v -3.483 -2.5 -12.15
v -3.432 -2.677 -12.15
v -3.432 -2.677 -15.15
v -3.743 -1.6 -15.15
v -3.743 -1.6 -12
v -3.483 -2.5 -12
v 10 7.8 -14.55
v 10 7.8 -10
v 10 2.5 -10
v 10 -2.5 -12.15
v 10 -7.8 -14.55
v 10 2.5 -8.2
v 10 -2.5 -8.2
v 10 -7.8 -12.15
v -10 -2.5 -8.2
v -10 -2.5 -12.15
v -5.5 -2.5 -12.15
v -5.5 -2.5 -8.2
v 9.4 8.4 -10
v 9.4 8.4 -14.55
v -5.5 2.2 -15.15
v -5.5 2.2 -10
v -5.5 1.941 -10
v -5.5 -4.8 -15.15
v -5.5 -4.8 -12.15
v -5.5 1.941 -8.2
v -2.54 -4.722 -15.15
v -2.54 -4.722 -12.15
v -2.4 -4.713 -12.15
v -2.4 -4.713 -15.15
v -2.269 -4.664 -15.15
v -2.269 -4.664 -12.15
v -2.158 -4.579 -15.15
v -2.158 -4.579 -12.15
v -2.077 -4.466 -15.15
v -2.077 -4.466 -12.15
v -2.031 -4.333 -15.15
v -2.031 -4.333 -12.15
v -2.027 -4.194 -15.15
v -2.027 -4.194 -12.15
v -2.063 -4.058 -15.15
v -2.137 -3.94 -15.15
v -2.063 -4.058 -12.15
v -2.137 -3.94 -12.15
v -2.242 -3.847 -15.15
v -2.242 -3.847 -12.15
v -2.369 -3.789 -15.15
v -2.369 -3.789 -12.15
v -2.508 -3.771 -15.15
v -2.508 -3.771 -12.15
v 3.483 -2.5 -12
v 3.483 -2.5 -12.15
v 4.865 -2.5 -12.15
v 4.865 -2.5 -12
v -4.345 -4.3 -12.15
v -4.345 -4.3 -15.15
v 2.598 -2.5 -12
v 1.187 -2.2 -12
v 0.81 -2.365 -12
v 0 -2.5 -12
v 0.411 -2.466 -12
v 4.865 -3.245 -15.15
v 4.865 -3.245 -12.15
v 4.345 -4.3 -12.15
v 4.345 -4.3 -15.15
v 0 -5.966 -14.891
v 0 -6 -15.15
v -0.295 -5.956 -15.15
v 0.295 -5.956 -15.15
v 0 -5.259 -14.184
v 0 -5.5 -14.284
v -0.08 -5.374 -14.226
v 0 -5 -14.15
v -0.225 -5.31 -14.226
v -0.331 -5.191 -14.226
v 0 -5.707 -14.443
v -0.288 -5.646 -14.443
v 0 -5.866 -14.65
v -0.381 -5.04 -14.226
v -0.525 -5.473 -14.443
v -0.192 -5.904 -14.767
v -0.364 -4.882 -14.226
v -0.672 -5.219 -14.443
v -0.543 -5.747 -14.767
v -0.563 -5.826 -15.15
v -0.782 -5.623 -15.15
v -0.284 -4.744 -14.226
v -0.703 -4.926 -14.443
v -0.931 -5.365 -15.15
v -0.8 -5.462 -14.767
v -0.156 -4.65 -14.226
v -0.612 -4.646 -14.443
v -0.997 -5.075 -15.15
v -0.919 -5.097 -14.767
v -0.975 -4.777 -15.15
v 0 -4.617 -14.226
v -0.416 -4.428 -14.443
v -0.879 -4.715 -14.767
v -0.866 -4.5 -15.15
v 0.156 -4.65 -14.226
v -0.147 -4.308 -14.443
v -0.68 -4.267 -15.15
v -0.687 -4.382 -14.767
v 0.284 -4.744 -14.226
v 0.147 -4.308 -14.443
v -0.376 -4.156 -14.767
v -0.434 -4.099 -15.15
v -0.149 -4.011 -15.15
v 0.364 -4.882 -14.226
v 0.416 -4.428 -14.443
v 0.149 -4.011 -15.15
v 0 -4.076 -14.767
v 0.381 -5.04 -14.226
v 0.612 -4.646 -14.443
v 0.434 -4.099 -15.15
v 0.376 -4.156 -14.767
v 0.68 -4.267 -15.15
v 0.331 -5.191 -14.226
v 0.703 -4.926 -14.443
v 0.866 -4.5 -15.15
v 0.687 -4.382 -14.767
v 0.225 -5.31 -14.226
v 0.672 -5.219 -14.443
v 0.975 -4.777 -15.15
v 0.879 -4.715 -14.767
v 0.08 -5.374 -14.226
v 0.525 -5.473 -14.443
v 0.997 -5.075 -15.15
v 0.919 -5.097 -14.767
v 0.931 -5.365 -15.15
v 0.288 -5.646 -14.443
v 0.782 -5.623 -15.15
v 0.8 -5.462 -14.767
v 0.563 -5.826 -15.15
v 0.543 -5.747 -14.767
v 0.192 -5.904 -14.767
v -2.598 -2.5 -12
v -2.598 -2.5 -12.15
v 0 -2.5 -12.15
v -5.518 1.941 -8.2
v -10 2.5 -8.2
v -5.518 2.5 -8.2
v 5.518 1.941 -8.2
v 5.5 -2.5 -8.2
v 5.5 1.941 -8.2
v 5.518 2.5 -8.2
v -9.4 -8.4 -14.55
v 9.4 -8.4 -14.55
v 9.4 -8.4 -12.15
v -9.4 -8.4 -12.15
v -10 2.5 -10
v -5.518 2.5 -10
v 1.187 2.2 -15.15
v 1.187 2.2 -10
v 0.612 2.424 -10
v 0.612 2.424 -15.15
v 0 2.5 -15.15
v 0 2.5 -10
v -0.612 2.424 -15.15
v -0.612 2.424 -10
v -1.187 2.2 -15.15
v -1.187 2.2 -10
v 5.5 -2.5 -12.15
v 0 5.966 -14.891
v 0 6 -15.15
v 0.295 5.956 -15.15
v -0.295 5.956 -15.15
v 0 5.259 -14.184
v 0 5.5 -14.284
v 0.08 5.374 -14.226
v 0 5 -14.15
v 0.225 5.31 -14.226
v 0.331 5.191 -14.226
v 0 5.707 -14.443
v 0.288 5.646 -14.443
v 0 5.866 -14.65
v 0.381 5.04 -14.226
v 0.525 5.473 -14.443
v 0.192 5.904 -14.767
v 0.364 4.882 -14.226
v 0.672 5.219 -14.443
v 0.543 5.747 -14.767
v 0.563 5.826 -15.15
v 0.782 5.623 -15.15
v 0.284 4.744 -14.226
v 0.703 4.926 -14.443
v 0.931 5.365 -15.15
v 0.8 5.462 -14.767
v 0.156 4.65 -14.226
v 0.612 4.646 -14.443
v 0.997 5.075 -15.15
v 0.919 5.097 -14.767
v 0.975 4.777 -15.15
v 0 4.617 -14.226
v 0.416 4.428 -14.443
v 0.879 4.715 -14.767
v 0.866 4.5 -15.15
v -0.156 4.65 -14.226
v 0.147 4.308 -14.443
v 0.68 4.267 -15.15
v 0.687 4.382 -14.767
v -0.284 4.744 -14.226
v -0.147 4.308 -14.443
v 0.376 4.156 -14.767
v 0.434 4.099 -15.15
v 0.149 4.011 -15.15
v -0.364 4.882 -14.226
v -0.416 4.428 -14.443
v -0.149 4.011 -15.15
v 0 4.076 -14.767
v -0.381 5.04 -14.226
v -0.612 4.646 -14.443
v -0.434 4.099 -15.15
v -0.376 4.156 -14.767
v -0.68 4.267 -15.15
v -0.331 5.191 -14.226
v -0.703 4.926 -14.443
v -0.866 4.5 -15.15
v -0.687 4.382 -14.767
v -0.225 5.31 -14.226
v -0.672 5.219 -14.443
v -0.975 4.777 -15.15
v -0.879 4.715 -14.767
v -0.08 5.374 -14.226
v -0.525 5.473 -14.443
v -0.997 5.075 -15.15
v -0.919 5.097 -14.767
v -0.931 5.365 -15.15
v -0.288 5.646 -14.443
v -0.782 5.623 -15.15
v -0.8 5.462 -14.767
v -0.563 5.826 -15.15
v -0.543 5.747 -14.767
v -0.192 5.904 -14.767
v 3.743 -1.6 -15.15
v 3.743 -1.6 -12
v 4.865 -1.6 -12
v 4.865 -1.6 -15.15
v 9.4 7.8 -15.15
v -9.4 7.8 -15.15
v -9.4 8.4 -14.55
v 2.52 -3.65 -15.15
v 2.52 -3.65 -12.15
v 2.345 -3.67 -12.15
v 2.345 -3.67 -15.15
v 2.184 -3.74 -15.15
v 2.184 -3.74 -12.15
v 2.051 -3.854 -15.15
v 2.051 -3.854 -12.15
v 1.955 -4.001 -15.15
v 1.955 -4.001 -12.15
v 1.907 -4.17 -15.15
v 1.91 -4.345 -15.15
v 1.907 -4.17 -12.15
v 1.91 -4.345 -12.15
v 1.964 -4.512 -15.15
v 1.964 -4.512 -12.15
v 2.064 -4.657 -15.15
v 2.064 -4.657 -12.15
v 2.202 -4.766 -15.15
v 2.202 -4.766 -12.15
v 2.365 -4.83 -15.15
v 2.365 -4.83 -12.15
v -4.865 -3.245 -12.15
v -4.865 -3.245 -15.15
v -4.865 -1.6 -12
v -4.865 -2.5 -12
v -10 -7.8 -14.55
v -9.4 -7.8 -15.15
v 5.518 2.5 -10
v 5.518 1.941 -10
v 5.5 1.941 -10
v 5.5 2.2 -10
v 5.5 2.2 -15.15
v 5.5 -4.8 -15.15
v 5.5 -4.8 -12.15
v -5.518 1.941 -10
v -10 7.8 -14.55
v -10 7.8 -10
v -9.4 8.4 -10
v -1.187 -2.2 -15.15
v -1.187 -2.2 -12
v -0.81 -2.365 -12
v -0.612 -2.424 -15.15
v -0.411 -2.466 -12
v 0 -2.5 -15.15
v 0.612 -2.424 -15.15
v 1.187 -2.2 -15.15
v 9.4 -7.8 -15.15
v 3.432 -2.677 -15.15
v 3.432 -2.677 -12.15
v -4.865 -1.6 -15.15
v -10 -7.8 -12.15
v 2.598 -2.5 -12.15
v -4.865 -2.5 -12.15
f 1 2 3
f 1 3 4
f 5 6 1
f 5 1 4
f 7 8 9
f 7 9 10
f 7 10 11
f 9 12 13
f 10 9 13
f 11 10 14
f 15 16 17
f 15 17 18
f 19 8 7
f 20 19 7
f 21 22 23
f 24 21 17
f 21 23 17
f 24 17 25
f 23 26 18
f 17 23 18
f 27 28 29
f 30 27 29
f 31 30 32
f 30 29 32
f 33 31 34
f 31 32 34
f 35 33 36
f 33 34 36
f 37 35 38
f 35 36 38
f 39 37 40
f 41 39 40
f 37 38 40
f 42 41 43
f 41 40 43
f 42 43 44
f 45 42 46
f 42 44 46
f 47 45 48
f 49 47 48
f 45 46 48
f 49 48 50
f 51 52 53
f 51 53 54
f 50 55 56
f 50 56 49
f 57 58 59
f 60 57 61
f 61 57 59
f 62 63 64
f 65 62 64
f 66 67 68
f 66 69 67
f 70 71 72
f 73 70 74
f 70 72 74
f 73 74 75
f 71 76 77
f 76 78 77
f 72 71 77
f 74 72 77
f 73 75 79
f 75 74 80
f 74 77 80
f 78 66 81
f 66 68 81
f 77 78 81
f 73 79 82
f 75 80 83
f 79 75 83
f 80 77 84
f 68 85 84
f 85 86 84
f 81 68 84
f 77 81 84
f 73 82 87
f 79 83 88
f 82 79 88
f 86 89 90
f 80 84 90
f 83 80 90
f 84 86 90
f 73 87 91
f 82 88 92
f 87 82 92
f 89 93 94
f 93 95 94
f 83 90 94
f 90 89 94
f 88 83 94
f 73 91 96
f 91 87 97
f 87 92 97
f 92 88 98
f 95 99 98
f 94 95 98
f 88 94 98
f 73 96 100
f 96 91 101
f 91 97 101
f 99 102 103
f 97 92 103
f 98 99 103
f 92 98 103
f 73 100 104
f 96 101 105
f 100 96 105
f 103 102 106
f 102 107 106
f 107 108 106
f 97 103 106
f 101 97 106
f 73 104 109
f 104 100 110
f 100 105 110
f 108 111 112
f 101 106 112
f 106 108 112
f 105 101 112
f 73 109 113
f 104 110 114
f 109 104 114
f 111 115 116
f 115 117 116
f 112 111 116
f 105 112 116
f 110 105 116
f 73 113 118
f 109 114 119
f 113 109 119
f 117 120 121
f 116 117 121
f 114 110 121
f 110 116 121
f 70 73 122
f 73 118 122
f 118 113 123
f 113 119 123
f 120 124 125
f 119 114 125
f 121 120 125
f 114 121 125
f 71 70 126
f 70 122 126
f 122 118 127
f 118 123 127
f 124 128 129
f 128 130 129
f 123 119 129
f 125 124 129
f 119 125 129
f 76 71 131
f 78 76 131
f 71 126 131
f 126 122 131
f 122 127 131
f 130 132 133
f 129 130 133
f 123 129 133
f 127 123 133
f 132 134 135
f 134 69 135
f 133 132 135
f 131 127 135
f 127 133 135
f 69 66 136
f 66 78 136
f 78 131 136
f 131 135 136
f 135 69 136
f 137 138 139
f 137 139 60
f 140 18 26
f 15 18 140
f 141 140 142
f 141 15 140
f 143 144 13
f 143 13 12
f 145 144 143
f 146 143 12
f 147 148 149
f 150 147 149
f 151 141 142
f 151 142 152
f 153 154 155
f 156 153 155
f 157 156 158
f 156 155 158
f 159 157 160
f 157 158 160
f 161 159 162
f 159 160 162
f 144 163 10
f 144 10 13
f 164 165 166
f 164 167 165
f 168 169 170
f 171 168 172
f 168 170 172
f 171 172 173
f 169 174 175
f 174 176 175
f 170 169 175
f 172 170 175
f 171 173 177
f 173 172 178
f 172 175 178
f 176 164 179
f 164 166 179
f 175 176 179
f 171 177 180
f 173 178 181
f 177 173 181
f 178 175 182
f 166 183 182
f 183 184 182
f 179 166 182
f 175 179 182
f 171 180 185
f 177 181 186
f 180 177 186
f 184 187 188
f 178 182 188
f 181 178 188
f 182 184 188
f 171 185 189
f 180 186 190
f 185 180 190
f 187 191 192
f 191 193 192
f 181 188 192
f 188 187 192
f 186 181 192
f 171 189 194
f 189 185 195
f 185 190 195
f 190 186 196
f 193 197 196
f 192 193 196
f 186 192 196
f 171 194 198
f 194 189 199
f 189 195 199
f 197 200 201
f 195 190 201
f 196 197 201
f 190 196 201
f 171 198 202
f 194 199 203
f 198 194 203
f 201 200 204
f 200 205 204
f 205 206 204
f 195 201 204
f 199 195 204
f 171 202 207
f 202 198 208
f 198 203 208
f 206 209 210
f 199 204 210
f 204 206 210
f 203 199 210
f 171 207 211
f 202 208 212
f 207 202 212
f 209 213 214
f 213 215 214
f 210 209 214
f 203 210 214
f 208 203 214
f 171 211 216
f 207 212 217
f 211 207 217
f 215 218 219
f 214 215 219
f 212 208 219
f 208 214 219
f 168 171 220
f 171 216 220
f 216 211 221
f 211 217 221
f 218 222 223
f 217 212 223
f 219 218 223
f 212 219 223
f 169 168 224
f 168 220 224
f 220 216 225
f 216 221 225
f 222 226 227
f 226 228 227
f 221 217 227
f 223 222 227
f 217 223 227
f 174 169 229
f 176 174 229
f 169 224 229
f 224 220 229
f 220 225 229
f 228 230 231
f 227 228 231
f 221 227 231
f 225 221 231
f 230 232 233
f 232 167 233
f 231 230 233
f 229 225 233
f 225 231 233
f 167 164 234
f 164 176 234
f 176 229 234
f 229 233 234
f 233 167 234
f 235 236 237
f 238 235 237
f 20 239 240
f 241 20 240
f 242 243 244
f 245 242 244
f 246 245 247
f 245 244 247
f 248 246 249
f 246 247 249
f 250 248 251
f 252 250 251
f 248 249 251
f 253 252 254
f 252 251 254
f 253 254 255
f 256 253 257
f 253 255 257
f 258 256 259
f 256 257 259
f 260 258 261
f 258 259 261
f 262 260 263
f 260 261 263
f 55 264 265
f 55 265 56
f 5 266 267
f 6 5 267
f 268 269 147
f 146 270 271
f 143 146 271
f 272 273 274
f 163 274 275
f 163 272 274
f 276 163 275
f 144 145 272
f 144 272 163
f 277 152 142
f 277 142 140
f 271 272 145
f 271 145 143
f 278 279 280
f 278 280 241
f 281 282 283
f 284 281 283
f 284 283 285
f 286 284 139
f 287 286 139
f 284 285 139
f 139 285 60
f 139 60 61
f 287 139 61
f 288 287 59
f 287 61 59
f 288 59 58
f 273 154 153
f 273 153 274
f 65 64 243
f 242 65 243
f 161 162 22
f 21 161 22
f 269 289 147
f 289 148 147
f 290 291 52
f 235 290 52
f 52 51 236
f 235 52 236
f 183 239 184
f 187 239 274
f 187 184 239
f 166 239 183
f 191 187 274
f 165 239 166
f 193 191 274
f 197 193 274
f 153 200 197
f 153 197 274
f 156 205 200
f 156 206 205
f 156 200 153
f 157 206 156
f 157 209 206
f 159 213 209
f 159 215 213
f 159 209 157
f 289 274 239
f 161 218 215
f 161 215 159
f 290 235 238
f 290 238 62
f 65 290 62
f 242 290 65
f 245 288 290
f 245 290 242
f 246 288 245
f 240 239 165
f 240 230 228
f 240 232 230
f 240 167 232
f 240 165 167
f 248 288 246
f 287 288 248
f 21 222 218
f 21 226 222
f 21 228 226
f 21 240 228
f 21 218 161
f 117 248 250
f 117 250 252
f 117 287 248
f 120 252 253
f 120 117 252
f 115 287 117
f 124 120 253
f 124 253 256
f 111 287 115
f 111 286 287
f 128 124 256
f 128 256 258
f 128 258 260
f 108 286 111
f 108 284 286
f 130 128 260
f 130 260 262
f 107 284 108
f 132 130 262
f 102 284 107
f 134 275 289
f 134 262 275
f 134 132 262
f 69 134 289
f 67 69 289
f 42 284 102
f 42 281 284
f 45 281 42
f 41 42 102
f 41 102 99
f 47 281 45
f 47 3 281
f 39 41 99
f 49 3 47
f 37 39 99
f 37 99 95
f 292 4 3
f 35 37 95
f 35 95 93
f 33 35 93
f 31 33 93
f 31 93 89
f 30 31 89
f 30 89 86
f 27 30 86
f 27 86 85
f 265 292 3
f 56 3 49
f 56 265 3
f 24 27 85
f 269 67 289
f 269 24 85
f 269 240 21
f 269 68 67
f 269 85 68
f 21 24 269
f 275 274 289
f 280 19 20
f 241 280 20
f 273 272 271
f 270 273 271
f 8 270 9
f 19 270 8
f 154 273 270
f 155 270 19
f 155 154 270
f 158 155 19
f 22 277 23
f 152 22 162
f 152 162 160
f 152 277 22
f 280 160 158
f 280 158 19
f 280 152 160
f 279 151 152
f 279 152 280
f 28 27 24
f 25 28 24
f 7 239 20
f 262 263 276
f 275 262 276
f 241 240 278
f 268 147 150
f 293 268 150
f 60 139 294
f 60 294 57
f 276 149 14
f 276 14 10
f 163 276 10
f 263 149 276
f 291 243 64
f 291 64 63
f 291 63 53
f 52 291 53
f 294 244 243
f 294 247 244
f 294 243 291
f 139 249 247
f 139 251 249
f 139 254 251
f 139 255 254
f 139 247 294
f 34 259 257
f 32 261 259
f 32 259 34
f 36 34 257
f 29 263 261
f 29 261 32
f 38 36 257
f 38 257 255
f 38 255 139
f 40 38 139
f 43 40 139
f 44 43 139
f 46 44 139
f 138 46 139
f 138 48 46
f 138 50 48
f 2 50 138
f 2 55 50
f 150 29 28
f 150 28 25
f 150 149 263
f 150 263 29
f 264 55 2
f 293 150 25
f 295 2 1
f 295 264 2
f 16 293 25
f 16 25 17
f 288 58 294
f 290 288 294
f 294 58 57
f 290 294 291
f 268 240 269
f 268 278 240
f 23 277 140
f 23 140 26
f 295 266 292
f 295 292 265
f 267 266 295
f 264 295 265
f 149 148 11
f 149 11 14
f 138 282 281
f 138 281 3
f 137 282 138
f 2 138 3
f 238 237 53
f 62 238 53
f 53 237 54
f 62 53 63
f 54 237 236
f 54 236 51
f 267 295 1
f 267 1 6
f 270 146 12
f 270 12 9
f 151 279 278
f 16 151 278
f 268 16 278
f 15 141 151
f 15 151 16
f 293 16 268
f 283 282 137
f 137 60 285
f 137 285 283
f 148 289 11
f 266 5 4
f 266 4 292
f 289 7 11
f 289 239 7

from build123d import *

# Parameters (mm, degrees)
PAD_DEPTH             = 10
POCKET_DEPTH          = 10
SKETCH009_W           = 3.913781
SKETCH009_H           = 10.54203
POCKET001_DEPTH       = 2
POLARPATTERN002_COUNT = 2
CHAMFER_SIZE          = 0.6
SKETCH011_W           = 0.658057
SKETCH011_H           = 11.036716
POCKET002_DEPTH       = 5
BODY_PLACEMENT_ANGLE  = 90


with BuildPart() as part:
    # Sketch001 → Pad (new body, symmetric)
    with BuildSketch(Plane.XZ):
        Polygon((-8.4, 0), (-8.4, -5.15), (8.4, -5.15), (8.4, -2.15), (2.5, -2.15), (2.5, 0), (2.5, 1.8), (-2.5, 1.8), (-2.5, 0), align=None)
    extrude(amount=PAD_DEPTH, both=True)

    # Sketch → Pocket (cut, symmetric)
    with BuildSketch(Plane.XY):
        with BuildLine():
            ThreePointArc((-2.2, 1.187434), (-2.5, 0), (-2.2, -1.187434))
            Line((-2.2, -1.187434), (-2.2, -5.5))
            Line((-2.2, -5.5), (4.8, -5.5))
            Line((4.722171, -2.539952), (4.8, -5.5))
            ThreePointArc((4.722171, -2.539952), (4.263597, -2.023905), (3.771176, -2.507761))
            Line((4.3, -4.344865), (3.771176, -2.507761))
            Line((3.244578, -4.864673), (4.3, -4.344865))
            Line((1.6, -4.864673), (3.244578, -4.864673))
            Line((1.6, -3.743474), (1.6, -4.864673))
            Line((2.677439, -3.432031), (1.6, -3.743474))
            Line((2.2, -1.187434), (2.677439, -3.432031))
            ThreePointArc((2.2, -1.187434), (2.5, 0), (2.2, 1.187434))
            Line((2.2, 1.187434), (2.677439, 3.432031))
            Line((2.677439, 3.432031), (1.6, 3.743474))
            Line((1.6, 3.743474), (1.6, 4.864673))
            Line((1.6, 4.864673), (3.244578, 4.864673))
            Line((3.244578, 4.864673), (4.3, 4.344865))
            Line((4.3, 4.344865), (3.650118, 2.519747))
            ThreePointArc((3.650118, 2.519747), (4.169872, 1.907371), (4.829785, 2.365262))
            Line((4.829785, 2.365262), (4.8, 5.5))
            Line((-2.2, 5.5), (4.8, 5.5))
            Line((-2.2, 1.187434), (-2.2, 5.5))
        make_face()
    extrude(amount=POCKET_DEPTH, both=True, mode=Mode.SUBTRACT)

    # Sketch009 → Pocket001 (cut, symmetric)
    with BuildSketch(Plane.XY):
        with Locations((3.133439, 0)):
            Rectangle(SKETCH009_W, SKETCH009_H)
    extrude(amount=POCKET001_DEPTH, both=True, mode=Mode.SUBTRACT)

    # Sphere001 → Sphere001 (revolve, cut)
    with BuildSketch(Plane(origin=(5, 0, -5.15), x_dir=(1, 0, 0), z_dir=(0, 1, 0))):
        with BuildLine():
            ThreePointArc((0, -1), (1, 0), (0, 1))
            Line((0, 1), (0, -1))
        make_face()
    sphere001 = revolve(axis=Axis((5, 0, -5.15), (0, 0, -1)), mode=Mode.SUBTRACT)

    # PolarPattern002: Sphere001 ×2 about axis
    polarpattern002_axis = Axis((0, 0, 0), (0, 0, 1))
    for i in range(1, POLARPATTERN002_COUNT):
        add(sphere001.rotate(polarpattern002_axis, i * 360 / POLARPATTERN002_COUNT), mode=Mode.SUBTRACT)

    # Chamfer
    chamfer_edges = [part.edges().sort_by_distance(p)[0] for p in [
        (8.4, 0, -5.15),
        (0, -10, -5.15),
        (0, 10, -5.15),
        (-8.4, 0, -5.15),
        (8.4, -10, -3.65),
        (8.4, 10, -3.65),
        (-8.4, -10, -2.575),
        (-8.4, 10, -2.575),
    ]]
    chamfer(chamfer_edges, length=CHAMFER_SIZE)

    # Sketch011 → Pocket002 (cut)
    with BuildSketch(Plane.XY):
        with Locations((-2.269595, 0)):
            Rectangle(SKETCH011_W, SKETCH011_H)
    extrude(amount=POCKET002_DEPTH, mode=Mode.SUBTRACT)


with BuildPart() as part_1:
    # Body placement: moved
    add(part.part.moved(Location((0, 0, -10))).rotate(Axis((0, 0, -10), (0, 0, -1)), BODY_PLACEMENT_ANGLE))


solid = part_1.part
